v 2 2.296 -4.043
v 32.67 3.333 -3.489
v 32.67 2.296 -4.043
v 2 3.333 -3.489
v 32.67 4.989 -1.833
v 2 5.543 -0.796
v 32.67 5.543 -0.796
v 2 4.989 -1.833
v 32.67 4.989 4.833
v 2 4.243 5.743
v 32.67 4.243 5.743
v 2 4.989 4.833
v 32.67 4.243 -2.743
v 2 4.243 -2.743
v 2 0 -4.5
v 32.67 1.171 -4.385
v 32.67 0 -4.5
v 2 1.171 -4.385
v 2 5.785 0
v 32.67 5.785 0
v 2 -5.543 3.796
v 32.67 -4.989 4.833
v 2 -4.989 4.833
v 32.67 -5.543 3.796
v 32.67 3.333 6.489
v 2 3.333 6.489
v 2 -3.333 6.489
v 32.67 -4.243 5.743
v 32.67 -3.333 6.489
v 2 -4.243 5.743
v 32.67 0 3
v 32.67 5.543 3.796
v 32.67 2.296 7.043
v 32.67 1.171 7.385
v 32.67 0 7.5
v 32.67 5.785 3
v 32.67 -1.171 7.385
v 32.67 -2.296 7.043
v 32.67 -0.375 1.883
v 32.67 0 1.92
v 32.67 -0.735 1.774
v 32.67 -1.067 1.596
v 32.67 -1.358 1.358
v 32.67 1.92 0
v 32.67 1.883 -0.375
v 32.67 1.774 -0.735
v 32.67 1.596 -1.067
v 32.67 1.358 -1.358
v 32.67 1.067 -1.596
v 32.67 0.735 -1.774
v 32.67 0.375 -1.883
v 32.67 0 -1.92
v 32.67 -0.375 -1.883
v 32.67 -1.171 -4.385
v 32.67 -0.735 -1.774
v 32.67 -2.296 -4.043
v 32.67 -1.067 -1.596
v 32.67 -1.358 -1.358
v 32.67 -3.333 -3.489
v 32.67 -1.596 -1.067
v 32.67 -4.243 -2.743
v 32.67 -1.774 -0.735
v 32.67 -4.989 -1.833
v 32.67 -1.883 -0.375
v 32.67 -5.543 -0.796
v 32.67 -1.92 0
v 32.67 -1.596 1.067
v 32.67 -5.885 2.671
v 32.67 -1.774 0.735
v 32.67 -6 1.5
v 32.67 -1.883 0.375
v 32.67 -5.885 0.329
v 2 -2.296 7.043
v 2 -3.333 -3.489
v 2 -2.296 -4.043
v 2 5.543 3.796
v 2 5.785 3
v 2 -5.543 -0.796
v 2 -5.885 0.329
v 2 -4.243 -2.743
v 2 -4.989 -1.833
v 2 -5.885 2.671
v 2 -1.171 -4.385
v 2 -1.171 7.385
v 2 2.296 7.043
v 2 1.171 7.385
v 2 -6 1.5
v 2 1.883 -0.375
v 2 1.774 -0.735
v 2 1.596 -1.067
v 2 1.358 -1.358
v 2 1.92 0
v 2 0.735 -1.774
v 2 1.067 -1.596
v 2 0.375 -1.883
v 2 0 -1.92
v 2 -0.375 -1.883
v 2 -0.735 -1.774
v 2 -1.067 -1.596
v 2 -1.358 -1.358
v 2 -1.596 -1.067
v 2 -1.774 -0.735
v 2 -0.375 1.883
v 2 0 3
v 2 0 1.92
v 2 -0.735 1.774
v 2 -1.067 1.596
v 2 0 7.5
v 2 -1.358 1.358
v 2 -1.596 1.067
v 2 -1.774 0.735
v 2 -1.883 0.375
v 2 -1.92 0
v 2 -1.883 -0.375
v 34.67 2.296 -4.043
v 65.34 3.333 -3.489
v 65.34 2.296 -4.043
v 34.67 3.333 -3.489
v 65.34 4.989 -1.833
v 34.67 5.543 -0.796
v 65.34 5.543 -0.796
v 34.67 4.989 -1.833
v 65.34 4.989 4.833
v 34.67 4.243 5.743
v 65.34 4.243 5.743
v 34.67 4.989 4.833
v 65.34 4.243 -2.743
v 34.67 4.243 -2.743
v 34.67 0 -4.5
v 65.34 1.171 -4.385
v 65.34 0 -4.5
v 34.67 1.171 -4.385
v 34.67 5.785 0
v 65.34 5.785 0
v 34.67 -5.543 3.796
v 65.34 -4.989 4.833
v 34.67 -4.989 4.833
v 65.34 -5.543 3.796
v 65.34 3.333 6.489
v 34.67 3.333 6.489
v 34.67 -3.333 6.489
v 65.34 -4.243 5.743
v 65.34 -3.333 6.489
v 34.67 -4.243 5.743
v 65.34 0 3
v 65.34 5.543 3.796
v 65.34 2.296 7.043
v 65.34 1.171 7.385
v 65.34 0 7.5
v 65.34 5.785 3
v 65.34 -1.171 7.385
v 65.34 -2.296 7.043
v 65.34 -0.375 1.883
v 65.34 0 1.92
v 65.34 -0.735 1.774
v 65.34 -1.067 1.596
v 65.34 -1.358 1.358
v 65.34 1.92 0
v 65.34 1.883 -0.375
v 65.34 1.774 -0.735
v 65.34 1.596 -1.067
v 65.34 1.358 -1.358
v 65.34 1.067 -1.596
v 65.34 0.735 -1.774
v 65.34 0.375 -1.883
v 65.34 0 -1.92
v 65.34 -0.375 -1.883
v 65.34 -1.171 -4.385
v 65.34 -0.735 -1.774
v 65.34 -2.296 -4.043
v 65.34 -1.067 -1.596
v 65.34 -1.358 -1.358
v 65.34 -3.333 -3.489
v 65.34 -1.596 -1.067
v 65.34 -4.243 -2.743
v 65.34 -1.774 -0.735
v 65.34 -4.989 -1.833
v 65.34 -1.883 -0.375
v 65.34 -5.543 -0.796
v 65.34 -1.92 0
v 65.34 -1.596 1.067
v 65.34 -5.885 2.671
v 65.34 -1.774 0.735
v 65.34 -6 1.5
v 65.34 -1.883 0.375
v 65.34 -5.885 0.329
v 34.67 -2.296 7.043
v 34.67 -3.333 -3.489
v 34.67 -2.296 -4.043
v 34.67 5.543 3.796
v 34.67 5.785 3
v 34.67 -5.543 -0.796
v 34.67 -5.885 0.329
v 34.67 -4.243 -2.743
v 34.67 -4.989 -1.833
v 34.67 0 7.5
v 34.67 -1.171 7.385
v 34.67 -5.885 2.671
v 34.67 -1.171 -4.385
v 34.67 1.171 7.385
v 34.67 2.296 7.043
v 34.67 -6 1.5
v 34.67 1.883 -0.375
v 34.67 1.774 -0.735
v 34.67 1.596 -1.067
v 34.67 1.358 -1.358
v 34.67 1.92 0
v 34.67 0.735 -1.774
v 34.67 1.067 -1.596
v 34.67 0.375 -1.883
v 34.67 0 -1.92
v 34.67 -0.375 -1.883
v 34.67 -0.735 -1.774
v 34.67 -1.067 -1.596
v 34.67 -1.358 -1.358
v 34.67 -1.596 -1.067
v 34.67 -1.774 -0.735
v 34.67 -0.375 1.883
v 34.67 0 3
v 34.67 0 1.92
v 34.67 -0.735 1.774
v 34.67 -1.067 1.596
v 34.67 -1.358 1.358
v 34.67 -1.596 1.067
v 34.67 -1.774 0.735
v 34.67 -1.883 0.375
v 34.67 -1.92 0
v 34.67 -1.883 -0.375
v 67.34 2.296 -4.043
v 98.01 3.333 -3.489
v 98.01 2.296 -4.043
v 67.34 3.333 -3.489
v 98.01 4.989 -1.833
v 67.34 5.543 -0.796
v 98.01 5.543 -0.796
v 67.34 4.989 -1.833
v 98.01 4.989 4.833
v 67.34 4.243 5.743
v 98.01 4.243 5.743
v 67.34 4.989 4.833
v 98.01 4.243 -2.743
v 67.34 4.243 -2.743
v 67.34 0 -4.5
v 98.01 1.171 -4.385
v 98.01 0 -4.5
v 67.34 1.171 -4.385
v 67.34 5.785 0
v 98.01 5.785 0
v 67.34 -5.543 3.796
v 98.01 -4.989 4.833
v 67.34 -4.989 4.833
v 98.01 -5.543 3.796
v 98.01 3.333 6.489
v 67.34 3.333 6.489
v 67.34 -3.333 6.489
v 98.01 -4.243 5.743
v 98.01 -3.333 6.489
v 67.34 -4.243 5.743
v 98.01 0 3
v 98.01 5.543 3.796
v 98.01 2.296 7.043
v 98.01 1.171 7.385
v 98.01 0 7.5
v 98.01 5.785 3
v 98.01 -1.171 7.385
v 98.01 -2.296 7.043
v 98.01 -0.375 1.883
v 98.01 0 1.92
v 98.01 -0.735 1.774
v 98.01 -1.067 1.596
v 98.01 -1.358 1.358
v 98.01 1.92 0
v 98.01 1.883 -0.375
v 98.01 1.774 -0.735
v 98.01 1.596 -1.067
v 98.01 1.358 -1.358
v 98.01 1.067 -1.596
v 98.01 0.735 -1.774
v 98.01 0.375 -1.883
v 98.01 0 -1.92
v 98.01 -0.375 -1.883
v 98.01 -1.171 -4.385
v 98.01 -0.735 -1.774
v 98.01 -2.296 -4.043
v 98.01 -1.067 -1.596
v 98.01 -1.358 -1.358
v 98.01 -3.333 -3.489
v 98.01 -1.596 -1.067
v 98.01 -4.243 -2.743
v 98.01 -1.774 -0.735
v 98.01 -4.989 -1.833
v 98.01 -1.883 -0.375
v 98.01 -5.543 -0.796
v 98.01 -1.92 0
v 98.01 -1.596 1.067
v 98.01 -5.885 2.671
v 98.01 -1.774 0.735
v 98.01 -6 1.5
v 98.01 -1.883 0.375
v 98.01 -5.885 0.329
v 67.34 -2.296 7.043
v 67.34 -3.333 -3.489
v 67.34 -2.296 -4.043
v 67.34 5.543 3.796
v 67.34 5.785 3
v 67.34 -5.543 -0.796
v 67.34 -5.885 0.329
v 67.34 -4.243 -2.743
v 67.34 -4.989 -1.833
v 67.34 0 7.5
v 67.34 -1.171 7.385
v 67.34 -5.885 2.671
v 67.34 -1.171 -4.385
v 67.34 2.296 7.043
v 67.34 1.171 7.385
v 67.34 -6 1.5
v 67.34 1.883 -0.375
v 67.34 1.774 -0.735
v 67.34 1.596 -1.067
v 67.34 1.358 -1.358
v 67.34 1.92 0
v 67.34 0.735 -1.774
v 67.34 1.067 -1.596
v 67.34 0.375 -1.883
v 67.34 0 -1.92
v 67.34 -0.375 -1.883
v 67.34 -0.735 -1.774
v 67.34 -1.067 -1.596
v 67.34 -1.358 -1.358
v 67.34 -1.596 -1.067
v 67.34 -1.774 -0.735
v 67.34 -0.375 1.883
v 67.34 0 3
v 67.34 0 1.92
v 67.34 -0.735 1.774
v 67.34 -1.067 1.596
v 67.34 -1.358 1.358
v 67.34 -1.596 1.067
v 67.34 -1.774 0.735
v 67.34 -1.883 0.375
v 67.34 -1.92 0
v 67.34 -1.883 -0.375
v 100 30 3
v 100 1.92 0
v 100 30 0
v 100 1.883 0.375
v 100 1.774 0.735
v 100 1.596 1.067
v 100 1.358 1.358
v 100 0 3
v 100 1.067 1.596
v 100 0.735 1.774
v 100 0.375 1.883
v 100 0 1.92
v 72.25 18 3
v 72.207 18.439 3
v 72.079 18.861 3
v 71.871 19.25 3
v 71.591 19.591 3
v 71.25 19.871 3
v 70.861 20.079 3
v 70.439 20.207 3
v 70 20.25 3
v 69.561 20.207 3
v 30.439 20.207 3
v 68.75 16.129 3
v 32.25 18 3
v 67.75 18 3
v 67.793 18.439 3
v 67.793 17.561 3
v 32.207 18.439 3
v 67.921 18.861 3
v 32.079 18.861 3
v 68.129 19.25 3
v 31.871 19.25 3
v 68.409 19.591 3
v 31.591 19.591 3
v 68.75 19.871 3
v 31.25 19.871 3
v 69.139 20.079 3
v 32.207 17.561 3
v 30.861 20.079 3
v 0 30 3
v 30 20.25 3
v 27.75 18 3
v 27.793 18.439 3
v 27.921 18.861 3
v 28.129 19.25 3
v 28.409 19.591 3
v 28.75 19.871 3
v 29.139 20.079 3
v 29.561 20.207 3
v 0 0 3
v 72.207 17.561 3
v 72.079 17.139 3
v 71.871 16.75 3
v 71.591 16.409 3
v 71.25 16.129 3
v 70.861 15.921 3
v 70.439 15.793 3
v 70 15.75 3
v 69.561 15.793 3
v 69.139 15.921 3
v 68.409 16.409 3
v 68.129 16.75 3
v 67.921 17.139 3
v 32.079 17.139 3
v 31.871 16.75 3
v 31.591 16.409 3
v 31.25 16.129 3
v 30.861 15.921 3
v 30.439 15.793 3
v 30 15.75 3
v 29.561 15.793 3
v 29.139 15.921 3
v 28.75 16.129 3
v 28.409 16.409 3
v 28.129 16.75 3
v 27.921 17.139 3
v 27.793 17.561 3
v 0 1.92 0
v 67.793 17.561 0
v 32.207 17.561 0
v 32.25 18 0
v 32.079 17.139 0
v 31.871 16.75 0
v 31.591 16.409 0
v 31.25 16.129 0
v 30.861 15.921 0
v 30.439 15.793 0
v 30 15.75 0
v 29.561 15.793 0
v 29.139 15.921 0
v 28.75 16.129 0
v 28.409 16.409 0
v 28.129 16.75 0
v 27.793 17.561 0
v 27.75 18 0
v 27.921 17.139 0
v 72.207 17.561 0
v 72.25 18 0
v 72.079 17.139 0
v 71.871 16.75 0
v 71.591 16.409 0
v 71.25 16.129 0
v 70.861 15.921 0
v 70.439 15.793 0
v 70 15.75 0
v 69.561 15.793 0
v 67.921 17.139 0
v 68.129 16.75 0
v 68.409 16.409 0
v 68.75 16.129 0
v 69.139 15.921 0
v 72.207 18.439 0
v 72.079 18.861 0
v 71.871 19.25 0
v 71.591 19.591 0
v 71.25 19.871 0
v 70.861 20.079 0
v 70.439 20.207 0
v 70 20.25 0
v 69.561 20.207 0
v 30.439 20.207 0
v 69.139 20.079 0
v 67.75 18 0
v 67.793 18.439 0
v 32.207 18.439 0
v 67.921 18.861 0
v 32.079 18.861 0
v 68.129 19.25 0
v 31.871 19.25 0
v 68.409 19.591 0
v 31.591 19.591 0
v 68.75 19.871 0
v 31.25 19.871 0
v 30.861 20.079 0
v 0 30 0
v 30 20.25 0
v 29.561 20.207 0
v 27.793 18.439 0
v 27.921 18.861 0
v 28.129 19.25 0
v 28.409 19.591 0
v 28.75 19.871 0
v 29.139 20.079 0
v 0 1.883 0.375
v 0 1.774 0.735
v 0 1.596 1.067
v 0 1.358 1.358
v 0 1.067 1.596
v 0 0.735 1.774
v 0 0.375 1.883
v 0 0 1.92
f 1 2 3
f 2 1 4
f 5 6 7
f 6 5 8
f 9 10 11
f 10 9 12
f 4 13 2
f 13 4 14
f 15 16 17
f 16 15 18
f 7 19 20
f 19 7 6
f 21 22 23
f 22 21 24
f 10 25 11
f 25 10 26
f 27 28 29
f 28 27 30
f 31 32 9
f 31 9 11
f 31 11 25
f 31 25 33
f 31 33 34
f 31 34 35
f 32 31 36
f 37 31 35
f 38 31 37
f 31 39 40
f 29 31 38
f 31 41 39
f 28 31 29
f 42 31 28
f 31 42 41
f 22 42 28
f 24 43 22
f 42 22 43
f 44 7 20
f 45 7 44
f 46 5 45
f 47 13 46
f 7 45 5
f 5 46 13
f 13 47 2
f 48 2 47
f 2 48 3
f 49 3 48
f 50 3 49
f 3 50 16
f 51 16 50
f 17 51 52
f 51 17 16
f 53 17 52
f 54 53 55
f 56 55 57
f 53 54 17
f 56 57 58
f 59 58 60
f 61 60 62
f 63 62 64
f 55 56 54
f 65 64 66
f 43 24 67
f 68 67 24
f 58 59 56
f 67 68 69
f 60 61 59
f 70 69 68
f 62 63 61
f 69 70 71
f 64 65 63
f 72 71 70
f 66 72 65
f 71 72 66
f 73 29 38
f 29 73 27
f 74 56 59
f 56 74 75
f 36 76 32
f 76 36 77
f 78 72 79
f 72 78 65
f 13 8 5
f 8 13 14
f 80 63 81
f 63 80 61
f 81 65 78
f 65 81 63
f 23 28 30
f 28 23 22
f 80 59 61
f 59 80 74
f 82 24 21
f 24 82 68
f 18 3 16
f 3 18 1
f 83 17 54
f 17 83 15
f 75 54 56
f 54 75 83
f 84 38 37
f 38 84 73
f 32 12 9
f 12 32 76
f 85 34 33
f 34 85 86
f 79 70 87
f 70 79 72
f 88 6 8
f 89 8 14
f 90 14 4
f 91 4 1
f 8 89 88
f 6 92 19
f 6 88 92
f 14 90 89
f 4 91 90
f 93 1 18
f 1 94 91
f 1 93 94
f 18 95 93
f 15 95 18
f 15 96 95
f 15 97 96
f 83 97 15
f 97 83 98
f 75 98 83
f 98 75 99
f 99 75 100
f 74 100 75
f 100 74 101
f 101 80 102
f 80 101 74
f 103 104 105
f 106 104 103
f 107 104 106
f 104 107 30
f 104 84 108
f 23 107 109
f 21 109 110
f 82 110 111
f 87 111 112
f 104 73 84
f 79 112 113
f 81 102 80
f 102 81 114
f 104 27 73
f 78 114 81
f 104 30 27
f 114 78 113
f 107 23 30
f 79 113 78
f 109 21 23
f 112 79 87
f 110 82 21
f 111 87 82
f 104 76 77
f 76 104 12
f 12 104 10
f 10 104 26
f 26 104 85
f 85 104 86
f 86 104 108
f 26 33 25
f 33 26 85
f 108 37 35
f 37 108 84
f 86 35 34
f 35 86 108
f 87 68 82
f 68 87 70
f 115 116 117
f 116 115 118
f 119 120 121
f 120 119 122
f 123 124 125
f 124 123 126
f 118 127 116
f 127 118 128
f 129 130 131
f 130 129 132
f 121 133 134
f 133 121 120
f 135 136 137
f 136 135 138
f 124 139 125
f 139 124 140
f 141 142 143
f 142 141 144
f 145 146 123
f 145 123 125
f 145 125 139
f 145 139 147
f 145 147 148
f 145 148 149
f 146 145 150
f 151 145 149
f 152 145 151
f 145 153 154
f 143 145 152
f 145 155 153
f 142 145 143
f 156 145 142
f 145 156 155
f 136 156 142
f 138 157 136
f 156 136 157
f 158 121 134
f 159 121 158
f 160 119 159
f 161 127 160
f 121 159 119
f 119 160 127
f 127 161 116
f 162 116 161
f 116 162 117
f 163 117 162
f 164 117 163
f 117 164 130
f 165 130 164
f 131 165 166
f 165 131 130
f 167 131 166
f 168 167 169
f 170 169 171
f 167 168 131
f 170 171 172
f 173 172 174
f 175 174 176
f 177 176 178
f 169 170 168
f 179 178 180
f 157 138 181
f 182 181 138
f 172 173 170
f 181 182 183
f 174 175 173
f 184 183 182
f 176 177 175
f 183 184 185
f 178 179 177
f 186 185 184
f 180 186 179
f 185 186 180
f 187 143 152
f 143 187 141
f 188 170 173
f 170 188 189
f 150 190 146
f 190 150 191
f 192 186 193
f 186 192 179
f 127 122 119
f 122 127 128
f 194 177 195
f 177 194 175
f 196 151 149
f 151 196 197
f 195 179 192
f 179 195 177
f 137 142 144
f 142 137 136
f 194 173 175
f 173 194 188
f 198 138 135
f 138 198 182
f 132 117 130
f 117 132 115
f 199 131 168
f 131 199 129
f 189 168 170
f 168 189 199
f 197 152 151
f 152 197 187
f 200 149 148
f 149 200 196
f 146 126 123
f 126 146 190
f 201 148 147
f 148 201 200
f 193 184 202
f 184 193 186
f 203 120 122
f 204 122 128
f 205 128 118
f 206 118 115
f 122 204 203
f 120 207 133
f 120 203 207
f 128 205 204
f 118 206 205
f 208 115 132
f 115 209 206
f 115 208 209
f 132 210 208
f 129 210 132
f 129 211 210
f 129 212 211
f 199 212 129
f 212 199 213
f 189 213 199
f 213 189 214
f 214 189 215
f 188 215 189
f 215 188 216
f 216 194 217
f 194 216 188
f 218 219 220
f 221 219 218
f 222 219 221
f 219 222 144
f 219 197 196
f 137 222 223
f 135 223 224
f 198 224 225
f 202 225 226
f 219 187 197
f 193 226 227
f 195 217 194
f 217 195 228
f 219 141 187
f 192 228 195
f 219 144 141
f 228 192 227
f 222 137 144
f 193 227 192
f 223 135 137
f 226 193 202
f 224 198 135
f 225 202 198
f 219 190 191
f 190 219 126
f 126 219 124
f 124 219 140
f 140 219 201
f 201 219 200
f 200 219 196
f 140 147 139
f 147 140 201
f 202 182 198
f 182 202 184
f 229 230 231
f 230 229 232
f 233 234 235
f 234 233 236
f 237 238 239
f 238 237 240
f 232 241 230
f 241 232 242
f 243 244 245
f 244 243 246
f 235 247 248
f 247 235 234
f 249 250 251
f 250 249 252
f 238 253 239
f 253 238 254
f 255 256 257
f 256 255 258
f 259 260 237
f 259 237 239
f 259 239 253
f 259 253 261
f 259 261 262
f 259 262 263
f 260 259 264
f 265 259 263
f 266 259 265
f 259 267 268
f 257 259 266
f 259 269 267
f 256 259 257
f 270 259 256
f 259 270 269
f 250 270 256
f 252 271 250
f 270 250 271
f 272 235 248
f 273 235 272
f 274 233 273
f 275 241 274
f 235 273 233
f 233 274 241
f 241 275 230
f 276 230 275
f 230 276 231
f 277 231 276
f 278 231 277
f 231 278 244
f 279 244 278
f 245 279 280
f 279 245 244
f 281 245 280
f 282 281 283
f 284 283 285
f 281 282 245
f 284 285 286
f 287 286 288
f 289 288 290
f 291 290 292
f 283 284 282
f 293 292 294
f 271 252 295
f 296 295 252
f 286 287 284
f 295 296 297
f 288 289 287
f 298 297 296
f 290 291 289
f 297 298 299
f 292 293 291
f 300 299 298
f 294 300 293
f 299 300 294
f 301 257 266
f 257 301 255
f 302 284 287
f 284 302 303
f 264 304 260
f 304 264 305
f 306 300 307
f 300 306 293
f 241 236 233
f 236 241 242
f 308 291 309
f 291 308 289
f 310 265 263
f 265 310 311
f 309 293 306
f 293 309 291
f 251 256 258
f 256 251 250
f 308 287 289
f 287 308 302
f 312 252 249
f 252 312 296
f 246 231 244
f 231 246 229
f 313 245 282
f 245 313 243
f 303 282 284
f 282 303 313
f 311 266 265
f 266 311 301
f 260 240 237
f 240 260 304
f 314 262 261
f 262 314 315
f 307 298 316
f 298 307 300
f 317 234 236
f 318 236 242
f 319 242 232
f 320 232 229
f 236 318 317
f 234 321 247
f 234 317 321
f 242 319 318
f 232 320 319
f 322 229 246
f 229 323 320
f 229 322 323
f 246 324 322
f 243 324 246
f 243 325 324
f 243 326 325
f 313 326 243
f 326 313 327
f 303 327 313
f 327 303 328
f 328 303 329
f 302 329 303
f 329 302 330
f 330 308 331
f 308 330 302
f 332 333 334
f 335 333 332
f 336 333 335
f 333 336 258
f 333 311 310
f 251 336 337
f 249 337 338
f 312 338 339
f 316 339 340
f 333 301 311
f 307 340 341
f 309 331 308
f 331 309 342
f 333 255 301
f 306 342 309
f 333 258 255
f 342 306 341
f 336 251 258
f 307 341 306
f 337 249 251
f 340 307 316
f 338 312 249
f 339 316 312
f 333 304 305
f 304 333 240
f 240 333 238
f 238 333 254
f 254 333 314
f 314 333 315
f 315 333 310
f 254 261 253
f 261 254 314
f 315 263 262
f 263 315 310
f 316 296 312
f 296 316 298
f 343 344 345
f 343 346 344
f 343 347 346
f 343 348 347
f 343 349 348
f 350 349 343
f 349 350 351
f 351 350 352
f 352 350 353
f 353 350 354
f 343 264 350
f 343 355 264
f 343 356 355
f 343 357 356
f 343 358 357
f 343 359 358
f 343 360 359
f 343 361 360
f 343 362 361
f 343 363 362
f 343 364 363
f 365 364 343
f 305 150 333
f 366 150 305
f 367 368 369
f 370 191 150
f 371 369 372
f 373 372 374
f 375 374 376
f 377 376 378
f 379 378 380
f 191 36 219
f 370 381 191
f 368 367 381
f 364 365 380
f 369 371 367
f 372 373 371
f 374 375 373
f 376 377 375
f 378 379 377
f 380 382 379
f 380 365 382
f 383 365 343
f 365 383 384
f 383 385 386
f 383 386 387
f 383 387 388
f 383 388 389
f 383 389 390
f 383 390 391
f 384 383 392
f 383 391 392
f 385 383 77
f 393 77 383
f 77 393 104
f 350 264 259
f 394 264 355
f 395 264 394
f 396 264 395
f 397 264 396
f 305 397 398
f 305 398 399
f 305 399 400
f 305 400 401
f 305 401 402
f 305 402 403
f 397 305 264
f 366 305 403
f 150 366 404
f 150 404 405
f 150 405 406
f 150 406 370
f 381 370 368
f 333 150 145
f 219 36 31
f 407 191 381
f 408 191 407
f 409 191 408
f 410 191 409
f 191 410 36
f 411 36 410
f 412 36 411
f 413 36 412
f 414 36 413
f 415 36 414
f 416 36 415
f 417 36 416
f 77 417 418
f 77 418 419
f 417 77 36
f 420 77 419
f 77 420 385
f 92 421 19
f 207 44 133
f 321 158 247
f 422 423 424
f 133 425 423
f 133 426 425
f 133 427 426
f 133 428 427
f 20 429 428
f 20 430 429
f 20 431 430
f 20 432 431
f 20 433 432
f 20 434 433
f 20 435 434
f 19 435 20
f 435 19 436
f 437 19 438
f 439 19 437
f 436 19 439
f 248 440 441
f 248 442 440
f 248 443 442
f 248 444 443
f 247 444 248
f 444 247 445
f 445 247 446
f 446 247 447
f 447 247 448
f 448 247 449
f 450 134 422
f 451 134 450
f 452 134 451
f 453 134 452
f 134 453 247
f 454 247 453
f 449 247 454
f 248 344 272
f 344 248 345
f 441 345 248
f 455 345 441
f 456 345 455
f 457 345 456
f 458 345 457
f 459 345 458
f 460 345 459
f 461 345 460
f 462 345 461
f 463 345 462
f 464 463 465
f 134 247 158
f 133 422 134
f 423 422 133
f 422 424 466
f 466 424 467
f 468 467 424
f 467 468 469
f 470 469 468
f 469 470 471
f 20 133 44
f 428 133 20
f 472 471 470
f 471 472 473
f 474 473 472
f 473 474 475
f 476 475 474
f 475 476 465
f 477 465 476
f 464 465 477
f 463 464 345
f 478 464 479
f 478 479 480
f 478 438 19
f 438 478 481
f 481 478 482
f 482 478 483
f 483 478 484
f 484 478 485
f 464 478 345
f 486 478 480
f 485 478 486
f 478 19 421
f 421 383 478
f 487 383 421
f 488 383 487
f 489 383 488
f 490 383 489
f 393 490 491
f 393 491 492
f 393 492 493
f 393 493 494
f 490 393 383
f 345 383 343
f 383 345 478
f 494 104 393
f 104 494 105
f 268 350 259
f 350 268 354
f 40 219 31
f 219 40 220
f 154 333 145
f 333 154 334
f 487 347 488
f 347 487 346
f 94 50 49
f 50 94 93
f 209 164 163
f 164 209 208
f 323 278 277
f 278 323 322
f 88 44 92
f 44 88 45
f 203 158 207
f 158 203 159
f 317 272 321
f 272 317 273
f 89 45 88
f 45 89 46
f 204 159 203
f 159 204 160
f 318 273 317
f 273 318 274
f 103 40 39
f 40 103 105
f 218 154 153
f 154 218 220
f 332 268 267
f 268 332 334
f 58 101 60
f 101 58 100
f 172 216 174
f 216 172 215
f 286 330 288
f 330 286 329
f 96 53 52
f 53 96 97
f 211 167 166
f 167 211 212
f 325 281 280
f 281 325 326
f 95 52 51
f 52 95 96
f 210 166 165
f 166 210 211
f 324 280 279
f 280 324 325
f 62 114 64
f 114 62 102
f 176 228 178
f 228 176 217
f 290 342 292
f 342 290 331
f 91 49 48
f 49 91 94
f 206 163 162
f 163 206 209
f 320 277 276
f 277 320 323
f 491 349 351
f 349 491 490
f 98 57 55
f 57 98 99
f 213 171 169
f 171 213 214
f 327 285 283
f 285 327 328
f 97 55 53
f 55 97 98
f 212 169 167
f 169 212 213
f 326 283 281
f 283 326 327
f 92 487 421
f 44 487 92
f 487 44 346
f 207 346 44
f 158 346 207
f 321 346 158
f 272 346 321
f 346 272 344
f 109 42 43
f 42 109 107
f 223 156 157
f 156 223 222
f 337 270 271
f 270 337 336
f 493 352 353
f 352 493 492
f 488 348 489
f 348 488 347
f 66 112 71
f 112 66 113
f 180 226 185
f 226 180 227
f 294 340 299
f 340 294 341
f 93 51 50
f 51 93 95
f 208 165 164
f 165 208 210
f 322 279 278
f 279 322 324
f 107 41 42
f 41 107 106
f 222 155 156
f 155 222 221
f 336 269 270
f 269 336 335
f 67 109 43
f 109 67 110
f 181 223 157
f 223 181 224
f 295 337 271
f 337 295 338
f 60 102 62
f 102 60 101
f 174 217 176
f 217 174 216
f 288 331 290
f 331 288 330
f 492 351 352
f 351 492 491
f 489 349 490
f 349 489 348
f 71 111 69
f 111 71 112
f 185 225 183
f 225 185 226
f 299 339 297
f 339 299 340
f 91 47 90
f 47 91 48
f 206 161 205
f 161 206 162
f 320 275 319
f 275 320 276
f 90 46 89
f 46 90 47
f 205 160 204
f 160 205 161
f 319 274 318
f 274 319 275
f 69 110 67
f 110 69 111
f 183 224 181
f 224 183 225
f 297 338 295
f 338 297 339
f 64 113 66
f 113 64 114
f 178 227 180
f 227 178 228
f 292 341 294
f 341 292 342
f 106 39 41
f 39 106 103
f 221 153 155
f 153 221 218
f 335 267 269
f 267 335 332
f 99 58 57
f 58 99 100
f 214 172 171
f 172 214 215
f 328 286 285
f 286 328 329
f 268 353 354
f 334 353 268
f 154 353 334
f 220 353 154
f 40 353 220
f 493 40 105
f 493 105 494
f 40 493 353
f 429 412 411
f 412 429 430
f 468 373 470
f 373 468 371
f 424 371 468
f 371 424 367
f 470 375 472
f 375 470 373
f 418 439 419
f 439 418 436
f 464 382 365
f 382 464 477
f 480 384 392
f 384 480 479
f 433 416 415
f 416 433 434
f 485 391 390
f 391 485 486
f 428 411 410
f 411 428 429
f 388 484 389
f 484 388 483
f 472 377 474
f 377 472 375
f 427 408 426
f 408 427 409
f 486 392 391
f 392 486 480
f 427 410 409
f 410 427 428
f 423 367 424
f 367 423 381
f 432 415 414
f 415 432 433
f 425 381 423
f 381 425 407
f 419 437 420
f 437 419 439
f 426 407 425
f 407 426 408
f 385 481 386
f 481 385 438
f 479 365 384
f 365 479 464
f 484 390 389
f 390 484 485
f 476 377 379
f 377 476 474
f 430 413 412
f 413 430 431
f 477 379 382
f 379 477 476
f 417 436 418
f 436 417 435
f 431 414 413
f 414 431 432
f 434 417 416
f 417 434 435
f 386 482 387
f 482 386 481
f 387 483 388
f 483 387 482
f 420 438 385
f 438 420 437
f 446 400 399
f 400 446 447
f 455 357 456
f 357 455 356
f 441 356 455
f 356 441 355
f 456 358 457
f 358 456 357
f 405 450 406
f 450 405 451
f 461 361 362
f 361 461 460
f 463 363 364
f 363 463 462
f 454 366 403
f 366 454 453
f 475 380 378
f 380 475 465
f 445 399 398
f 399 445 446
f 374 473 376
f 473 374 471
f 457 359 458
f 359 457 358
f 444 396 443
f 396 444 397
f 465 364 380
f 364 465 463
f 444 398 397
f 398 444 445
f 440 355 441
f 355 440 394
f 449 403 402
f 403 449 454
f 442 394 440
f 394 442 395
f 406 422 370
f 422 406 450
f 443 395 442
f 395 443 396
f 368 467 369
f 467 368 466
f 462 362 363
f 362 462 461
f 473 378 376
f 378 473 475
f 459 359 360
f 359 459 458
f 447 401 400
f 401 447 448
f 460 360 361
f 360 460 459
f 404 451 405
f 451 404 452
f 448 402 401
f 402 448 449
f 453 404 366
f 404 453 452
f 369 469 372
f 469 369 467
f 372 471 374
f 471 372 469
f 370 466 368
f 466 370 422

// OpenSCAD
$fn = 32;

// ----------------------------------------------------------------------
// Hinge leaf: 100 x 36 x 12 mm
// ----------------------------------------------------------------------

// --- parameters (mm) ---
tab_len = 100;            // leaf length, X
tab_w = 30;               // leaf width, Y
tab_t = 3;                // leaf thickness
ring_d = 12;              // knuckle diameter
ring_w = 30.67;           // knuckle width
knuckle_n = 3;            // number of knuckles
pin_d = 3.84;             // pin bore
gap = 2;                  // gap between the knuckles
screw_d = 4.5;            // screw clearance

module leaf() {
  cube([tab_len, tab_w, tab_t]);
}

module knuckles() {
  /* barrels sit on the leaf edge, the pin axis at half the leaf thickness */
  for (i = [0 : knuckle_n - 1])
    translate([gap + i * (ring_w + gap), 0, tab_t * 0.5])
      rotate([0, 90, 0]) cylinder(h = ring_w, d = ring_d);
}

difference() {
  union() {
    leaf();
    knuckles();
  }
  rotate([0, 90, 0]) translate([0, 0, -1])
    cylinder(h = tab_len + 2, d = pin_d);
  translate([30, tab_w * 0.6, -1]) cylinder(h = tab_t + 2, d = screw_d);
  translate([70, tab_w * 0.6, -1]) cylinder(h = tab_t + 2, d = screw_d);
}
